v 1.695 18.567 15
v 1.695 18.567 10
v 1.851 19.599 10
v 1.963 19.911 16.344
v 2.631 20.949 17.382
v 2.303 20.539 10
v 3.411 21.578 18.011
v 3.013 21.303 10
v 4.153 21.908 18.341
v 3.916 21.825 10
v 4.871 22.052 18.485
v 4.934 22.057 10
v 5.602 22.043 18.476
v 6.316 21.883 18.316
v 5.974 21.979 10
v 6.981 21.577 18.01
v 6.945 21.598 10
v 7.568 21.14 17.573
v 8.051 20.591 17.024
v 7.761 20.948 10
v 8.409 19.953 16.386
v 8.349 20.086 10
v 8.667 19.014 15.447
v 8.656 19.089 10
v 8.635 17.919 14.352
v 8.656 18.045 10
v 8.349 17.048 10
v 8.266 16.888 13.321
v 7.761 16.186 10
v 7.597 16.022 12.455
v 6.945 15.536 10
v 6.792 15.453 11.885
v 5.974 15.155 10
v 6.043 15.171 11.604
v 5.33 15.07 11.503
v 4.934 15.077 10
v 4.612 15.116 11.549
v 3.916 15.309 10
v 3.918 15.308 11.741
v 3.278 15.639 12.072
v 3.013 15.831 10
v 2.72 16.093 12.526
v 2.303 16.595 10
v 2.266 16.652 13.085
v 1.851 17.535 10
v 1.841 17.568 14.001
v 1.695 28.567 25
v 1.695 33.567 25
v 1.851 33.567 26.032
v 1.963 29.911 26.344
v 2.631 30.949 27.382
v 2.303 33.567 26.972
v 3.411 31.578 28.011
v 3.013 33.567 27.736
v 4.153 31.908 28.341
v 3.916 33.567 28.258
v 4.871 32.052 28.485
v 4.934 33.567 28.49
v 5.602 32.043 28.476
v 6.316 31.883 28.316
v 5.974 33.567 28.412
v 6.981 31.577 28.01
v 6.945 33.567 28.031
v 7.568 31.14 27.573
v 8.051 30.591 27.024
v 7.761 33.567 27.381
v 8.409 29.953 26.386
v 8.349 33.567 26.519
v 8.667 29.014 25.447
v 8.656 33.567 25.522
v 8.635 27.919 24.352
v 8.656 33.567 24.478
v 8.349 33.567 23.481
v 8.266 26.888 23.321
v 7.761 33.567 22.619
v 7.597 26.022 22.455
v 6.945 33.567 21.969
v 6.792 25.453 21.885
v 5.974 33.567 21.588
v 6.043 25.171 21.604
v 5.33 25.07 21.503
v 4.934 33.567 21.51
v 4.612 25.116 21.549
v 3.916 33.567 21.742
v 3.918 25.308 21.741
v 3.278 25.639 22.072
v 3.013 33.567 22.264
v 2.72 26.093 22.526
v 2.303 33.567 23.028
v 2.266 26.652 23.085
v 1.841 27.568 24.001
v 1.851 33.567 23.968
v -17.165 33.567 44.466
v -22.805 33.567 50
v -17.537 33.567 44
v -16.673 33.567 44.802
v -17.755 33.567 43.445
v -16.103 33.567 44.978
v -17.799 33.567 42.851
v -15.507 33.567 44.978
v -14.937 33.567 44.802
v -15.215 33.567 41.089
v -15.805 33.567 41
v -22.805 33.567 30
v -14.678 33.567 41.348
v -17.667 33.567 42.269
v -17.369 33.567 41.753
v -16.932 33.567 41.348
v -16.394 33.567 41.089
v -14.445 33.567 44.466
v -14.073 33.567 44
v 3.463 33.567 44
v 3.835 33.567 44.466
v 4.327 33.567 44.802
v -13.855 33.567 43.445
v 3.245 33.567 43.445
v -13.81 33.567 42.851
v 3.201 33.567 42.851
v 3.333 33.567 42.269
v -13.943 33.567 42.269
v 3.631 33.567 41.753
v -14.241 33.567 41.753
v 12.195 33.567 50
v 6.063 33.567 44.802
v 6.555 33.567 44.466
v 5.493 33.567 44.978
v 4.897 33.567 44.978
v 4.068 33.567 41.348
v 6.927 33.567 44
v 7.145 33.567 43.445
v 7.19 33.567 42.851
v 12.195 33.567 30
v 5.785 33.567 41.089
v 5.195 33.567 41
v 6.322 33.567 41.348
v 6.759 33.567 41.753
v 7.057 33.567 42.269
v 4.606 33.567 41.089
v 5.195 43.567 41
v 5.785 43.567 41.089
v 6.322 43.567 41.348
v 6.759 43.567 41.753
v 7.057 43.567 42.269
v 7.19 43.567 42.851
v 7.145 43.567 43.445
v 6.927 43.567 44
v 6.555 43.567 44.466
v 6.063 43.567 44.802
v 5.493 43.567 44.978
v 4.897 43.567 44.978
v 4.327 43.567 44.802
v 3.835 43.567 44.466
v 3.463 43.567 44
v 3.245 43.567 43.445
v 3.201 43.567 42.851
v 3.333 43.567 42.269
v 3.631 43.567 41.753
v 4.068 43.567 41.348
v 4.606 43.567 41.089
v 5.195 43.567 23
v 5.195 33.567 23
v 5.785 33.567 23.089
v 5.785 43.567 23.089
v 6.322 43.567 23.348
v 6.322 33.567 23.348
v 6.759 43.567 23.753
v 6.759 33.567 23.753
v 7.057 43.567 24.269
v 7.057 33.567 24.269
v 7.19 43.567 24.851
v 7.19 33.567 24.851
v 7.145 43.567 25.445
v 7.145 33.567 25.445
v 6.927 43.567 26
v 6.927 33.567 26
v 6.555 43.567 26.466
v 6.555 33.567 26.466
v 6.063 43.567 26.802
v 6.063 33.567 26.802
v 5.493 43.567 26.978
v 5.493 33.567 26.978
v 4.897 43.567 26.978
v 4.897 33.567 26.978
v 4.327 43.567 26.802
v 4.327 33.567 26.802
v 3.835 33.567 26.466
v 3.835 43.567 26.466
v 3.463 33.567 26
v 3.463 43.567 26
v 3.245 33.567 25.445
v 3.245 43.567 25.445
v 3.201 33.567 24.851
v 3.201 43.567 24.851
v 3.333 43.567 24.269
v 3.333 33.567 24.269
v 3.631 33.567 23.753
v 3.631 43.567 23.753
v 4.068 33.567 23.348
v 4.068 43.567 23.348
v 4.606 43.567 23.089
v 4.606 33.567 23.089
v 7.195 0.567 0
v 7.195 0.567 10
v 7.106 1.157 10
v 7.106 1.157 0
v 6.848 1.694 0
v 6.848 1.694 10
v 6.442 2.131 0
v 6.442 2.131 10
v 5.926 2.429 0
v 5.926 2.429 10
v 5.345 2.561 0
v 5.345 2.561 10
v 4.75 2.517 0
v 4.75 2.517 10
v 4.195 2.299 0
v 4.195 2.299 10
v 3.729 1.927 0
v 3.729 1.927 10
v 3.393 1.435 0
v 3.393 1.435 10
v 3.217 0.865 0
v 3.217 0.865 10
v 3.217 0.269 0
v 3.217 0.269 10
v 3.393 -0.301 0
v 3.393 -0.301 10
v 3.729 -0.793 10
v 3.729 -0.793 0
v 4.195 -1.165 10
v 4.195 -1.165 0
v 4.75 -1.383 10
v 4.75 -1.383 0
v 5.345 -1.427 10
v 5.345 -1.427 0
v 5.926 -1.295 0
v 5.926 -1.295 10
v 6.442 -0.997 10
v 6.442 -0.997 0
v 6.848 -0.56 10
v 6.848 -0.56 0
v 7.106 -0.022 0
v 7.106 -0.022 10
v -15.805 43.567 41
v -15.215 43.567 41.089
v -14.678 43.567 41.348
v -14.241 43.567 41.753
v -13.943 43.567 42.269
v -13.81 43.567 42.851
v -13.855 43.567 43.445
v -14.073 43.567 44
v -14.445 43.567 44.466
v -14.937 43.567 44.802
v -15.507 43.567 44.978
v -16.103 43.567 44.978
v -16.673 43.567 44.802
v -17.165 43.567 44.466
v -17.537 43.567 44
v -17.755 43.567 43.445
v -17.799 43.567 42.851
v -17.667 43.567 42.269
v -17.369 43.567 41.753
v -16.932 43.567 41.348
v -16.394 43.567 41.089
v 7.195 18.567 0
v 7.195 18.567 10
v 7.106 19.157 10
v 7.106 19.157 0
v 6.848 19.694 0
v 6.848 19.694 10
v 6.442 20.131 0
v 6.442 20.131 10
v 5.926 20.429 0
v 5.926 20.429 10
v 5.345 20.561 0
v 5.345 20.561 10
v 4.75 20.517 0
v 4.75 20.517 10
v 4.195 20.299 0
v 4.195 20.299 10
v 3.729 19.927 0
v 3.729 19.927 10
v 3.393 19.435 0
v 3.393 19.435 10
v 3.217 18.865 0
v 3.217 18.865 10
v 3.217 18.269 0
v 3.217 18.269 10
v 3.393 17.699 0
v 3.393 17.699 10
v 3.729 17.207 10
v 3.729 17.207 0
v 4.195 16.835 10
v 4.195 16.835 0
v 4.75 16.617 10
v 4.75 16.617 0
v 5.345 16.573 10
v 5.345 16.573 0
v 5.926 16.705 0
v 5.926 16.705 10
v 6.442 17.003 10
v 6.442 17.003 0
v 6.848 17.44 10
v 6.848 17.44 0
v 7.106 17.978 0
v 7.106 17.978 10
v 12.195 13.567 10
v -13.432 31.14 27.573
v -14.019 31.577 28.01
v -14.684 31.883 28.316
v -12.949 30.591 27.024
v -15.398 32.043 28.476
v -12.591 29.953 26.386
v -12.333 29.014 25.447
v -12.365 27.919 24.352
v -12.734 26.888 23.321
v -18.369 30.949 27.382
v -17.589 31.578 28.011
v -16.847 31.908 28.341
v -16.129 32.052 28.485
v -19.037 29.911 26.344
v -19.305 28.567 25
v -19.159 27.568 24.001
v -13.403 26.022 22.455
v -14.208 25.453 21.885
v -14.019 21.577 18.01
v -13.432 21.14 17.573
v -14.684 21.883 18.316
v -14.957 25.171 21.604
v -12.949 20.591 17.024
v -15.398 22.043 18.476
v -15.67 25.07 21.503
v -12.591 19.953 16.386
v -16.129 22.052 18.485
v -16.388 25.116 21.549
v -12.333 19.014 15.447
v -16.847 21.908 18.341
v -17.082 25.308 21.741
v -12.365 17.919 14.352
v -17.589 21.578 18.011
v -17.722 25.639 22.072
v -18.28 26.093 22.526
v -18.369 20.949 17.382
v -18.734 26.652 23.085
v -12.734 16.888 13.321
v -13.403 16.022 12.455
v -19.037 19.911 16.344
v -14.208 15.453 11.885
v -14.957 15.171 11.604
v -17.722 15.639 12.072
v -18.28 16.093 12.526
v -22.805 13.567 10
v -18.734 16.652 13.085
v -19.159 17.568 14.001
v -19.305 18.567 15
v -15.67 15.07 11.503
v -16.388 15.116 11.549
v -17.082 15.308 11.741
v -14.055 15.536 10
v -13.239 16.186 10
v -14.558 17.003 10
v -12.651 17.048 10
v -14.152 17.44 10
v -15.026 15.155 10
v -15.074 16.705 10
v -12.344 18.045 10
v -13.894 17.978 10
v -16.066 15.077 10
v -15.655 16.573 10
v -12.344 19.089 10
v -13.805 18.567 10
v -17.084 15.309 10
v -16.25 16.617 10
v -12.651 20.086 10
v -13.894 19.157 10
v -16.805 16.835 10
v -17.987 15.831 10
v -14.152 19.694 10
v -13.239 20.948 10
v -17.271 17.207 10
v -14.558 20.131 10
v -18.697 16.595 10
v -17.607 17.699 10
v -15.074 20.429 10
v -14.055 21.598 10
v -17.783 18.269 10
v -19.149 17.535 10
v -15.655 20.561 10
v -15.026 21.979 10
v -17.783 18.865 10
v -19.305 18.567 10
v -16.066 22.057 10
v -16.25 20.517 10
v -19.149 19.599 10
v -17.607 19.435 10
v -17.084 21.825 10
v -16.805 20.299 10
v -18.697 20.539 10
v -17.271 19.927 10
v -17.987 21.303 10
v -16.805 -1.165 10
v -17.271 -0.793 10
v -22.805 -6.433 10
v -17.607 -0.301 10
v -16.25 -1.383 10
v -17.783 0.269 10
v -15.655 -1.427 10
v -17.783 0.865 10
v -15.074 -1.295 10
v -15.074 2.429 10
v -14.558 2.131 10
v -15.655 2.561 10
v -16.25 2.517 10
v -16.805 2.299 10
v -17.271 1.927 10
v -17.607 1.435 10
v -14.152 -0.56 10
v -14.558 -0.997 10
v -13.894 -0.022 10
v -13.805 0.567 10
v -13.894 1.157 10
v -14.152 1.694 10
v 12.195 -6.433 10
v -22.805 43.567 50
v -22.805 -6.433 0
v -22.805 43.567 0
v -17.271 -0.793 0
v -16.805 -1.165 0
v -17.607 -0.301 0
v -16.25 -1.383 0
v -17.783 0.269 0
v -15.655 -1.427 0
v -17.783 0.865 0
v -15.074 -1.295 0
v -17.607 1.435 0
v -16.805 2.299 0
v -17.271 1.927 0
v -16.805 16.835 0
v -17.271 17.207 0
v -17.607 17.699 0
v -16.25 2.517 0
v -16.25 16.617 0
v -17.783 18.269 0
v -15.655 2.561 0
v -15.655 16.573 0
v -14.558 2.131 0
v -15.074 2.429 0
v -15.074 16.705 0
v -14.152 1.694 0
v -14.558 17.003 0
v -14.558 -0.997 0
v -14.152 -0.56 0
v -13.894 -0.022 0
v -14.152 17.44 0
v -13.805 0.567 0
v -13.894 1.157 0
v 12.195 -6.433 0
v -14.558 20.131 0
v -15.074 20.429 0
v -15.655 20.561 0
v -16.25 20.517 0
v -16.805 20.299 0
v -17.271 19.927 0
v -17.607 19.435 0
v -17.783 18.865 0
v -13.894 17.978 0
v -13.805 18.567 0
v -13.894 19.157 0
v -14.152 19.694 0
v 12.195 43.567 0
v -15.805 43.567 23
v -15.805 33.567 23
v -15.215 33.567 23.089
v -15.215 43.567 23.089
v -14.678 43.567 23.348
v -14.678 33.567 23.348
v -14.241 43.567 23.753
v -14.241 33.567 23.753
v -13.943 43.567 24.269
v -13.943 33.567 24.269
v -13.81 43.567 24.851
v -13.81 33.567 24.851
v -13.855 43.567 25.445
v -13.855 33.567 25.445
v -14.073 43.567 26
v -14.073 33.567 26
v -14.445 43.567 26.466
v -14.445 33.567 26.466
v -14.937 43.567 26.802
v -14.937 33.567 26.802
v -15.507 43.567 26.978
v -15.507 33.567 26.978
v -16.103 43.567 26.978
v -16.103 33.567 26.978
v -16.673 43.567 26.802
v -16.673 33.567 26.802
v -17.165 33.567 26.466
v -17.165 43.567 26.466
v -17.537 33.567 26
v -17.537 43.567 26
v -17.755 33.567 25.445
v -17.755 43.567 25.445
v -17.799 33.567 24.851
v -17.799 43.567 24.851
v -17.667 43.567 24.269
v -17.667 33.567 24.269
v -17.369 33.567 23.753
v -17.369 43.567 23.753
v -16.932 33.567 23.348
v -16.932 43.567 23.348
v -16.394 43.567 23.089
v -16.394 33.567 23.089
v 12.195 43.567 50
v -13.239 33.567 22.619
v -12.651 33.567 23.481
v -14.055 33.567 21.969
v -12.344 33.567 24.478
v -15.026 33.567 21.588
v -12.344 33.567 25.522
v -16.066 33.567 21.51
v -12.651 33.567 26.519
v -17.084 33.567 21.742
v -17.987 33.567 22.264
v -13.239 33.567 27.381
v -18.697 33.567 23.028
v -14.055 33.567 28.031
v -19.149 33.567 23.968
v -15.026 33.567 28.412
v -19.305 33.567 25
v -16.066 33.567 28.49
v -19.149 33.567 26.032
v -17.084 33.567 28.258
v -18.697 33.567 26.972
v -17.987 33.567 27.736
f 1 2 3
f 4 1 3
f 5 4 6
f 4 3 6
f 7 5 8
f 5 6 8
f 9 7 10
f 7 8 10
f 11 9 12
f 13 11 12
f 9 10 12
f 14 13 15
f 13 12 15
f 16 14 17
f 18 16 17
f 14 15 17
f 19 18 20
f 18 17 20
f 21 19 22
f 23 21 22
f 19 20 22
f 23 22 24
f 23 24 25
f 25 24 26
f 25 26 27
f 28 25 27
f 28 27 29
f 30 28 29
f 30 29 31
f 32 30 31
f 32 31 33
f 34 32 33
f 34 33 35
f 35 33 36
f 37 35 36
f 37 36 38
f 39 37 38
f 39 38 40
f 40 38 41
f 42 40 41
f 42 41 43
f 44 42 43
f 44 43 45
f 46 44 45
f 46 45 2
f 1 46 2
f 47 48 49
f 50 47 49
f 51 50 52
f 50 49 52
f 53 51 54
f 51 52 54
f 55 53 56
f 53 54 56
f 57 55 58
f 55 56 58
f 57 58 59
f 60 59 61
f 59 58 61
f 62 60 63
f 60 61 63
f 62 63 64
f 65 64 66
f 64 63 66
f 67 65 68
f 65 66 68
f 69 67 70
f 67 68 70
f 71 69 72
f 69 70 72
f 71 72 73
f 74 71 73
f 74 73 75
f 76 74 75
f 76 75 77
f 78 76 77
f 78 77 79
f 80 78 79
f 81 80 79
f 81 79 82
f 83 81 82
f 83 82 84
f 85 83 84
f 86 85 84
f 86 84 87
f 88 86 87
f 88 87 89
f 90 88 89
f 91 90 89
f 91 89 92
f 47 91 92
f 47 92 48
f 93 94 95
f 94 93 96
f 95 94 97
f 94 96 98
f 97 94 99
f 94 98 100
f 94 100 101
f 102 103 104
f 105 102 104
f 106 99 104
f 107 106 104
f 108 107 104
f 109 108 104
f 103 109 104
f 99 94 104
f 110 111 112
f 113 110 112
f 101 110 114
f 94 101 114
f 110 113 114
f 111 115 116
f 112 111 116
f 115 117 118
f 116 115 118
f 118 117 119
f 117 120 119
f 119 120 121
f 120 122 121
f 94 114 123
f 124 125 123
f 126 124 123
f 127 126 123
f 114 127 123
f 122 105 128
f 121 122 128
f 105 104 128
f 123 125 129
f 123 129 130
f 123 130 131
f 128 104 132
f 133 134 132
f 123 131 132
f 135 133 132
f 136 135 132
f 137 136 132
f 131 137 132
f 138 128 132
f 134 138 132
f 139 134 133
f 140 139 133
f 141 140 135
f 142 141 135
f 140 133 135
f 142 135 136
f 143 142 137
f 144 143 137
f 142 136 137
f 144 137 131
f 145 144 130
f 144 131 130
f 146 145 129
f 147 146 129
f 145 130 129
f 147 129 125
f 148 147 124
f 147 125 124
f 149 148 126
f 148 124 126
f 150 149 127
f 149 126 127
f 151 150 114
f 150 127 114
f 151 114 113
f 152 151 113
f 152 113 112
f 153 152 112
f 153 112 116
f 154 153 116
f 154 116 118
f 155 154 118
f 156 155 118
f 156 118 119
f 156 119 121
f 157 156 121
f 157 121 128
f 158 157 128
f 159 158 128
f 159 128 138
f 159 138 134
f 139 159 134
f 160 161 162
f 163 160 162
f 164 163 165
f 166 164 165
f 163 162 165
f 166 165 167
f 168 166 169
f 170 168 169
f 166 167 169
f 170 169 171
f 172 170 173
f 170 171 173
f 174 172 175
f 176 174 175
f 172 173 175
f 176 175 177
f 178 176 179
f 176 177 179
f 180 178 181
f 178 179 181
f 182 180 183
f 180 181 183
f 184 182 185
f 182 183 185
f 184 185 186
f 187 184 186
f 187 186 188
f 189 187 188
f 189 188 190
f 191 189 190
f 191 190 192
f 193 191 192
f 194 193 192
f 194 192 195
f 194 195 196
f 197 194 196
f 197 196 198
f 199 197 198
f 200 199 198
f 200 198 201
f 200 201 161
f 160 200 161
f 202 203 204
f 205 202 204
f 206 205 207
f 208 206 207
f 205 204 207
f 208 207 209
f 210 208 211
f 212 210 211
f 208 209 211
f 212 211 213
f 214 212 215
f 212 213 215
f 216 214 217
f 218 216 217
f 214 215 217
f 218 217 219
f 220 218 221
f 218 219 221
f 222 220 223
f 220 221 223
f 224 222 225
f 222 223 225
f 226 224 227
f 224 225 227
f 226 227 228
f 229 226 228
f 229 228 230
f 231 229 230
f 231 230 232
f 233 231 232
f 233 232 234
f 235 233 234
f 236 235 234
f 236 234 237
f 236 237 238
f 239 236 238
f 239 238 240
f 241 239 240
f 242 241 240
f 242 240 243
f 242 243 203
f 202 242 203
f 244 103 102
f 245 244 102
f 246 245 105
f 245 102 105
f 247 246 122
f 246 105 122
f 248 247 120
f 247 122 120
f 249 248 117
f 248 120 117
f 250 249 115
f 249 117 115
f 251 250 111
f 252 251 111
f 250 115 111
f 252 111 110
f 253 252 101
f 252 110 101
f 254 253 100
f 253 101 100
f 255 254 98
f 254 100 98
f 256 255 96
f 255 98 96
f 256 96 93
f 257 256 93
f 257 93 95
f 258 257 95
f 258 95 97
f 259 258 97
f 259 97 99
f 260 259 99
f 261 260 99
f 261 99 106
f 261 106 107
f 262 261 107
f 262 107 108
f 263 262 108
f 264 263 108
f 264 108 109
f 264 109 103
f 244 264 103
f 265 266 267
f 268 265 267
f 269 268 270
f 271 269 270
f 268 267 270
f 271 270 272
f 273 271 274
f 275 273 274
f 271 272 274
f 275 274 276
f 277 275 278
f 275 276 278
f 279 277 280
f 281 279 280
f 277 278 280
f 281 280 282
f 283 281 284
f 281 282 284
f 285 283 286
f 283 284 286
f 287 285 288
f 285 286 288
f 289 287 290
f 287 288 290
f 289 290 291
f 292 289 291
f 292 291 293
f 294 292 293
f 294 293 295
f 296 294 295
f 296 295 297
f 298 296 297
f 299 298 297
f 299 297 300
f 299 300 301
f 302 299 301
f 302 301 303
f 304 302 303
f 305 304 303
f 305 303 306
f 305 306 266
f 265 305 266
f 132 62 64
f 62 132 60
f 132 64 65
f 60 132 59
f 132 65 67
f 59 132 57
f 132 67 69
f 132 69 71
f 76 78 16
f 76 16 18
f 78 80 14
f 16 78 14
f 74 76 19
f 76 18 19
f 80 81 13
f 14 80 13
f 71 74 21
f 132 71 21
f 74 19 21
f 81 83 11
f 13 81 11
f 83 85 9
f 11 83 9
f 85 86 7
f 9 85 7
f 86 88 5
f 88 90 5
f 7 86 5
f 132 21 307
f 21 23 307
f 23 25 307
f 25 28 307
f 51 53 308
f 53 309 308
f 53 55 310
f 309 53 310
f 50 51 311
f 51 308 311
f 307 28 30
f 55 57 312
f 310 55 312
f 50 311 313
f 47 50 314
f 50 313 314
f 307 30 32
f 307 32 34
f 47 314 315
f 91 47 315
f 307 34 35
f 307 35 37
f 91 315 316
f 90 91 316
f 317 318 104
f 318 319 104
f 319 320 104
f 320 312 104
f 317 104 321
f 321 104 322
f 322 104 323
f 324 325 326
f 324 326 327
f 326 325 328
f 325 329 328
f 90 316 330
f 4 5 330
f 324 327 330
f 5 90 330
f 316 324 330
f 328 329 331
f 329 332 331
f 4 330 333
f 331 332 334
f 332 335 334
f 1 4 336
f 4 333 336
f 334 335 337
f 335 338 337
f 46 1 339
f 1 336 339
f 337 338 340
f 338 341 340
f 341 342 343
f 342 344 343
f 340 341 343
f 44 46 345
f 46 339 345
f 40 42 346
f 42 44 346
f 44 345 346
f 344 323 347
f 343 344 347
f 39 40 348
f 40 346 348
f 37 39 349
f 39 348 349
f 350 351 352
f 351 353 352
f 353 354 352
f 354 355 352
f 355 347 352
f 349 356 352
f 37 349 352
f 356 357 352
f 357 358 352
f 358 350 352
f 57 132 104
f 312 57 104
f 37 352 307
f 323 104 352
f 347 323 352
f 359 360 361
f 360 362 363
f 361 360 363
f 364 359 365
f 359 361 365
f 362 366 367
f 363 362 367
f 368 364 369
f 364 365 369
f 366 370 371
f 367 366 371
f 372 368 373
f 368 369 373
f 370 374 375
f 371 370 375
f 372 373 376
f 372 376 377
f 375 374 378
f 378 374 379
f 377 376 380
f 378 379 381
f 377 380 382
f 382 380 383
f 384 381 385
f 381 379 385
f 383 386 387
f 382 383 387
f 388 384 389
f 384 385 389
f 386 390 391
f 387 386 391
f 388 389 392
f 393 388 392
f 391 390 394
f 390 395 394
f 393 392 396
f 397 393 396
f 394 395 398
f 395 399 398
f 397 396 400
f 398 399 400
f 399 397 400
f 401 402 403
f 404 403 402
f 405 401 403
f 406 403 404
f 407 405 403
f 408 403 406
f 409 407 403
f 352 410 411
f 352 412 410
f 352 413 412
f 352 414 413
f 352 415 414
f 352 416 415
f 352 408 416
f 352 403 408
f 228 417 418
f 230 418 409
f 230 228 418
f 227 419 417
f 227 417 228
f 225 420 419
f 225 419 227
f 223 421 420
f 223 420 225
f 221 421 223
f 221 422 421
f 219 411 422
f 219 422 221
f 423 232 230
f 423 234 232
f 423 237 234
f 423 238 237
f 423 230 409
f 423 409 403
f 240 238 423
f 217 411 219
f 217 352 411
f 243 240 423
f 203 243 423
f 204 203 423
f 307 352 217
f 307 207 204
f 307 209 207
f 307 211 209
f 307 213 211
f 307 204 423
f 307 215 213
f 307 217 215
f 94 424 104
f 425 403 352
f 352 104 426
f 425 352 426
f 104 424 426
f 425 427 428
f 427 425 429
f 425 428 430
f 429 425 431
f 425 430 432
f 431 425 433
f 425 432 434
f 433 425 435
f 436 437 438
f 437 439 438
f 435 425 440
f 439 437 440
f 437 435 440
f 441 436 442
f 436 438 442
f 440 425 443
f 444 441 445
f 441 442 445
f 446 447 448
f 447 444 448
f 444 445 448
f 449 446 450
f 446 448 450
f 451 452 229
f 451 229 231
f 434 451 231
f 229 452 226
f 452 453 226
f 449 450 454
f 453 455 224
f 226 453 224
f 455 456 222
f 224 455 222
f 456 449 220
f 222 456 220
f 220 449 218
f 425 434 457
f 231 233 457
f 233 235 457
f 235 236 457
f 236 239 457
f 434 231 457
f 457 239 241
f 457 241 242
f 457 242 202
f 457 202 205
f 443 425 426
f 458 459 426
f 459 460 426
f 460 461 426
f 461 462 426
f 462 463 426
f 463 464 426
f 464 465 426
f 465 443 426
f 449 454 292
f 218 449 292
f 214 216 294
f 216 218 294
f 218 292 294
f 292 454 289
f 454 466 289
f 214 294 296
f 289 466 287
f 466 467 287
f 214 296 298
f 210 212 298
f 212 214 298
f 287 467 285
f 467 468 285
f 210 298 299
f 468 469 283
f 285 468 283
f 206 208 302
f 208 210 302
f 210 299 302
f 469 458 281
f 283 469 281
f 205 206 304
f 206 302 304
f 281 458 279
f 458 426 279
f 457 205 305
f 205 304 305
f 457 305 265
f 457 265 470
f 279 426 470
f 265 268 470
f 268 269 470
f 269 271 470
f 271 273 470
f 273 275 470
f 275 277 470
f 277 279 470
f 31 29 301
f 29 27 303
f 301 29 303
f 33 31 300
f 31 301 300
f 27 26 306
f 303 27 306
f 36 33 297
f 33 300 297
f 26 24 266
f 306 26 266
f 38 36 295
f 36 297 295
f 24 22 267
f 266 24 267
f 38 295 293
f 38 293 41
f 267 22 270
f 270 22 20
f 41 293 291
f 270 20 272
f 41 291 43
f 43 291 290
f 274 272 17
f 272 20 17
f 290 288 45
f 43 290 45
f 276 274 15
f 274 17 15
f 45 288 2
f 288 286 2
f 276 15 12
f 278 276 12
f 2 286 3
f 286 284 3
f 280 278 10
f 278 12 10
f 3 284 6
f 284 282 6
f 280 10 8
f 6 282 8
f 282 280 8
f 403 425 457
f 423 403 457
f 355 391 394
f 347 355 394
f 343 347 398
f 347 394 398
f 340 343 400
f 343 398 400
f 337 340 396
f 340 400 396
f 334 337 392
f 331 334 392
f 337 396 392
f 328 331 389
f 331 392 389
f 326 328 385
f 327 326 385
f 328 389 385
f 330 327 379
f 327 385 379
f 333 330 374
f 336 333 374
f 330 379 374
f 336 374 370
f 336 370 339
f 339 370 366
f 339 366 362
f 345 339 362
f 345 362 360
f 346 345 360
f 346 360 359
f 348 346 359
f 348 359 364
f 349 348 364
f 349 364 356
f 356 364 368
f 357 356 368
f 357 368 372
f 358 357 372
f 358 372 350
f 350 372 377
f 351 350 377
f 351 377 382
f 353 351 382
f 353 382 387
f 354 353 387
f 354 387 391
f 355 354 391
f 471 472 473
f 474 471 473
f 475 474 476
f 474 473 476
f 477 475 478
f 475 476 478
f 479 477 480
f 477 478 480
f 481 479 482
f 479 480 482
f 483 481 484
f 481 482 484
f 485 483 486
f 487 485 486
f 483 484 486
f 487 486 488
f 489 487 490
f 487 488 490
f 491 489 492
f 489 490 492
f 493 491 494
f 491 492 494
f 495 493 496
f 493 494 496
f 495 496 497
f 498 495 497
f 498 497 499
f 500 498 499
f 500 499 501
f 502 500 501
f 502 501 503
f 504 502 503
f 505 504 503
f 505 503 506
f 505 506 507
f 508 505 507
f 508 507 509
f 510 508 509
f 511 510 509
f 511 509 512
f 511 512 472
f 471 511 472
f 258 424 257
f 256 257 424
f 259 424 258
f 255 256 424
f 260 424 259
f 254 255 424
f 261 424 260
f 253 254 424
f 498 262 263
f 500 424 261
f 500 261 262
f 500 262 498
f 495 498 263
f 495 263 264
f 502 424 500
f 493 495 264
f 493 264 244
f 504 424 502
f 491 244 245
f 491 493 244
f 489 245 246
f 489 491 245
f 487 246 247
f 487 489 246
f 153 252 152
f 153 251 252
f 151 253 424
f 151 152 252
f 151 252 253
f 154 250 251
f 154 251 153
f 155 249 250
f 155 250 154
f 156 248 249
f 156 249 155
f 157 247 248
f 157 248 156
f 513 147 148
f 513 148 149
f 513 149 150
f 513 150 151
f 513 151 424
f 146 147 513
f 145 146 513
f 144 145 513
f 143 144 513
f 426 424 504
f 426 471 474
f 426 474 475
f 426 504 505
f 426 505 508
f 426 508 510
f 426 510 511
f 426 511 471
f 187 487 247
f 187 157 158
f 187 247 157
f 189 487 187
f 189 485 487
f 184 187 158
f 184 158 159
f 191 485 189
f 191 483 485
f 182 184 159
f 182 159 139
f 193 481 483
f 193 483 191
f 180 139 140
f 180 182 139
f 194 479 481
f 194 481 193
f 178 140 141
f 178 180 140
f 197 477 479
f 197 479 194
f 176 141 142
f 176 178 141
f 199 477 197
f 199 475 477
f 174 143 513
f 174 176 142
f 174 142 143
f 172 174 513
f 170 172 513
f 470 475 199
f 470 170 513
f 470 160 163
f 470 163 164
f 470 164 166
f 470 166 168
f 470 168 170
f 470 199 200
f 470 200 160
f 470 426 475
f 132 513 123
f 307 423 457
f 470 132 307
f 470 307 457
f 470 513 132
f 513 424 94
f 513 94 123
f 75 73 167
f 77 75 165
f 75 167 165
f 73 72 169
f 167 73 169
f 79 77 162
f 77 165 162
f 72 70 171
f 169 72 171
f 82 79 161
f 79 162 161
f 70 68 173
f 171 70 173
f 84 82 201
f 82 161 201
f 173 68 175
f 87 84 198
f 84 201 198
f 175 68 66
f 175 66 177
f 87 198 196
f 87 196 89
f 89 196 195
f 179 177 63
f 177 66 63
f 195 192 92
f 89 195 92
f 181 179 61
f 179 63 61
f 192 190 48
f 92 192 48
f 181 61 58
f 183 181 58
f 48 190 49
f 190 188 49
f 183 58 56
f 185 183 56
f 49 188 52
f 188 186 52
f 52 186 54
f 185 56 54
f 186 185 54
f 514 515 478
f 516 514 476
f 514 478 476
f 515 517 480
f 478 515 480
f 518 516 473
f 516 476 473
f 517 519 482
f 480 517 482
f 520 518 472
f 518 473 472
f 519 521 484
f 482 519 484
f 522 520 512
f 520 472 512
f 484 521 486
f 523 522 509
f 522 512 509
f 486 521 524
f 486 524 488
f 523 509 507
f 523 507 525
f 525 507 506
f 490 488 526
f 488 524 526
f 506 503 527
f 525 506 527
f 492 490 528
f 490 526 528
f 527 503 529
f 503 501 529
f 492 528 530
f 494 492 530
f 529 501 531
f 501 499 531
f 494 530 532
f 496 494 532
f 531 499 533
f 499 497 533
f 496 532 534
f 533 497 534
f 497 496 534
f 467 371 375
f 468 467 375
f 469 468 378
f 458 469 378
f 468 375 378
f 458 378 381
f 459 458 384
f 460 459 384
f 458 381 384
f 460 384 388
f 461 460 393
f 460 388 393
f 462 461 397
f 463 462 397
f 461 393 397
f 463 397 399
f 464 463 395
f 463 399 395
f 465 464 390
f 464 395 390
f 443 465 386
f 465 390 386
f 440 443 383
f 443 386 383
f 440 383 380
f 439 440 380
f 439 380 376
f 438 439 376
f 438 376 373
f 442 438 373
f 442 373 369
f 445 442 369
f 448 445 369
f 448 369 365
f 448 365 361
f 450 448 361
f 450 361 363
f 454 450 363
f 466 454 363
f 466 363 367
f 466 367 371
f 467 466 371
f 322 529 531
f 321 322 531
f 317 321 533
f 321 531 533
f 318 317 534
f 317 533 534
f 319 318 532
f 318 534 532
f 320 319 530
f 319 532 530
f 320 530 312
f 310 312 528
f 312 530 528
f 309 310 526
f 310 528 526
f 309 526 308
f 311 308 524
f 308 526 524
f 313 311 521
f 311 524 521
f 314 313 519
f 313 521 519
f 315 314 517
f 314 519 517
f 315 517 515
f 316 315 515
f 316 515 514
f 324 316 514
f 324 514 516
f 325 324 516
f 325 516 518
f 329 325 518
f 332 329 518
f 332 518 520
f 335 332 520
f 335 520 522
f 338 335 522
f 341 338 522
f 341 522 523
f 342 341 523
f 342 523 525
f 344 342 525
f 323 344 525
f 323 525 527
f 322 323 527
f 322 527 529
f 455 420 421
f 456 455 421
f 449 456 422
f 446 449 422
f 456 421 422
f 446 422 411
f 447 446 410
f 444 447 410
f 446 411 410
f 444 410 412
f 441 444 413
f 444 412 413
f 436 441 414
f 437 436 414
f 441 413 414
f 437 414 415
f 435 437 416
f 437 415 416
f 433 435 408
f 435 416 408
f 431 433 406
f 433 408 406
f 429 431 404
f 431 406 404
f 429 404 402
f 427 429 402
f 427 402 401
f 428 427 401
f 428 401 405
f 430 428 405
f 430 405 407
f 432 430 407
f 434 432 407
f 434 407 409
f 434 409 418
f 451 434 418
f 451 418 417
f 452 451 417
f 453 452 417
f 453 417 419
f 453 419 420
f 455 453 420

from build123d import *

# Parameters (mm, degrees)
SKETCH1_W           = 35
SKETCH1_H           = 50
BOSS_EXTRUDE1_DEPTH = 10
SKETCH2_W           = 35
SKETCH2_H           = 10
BOSS_EXTRUDE2_DEPTH = 40
SKETCH3_R           = 2
CUT_EXTRUDE1_DEPTH  = 30
SKETCH4_R           = 2
CUT_EXTRUDE2_DEPTH  = 30
BOSS_EXTRUDE3_DEPTH = 35
SKETCH6_R           = 3.5
CUT_EXTRUDE3_DEPTH  = 30
SKETCH7_R           = 3.5
CUT_EXTRUDE4_DEPTH  = 30


with BuildPart() as part:
    # Sketch1 → Boss-Extrude1 (new body)
    with BuildSketch(Plane.XY):
        with Locations((-5.304878049, 18.567073171)):
            Rectangle(SKETCH1_W, SKETCH1_H)
    extrude(amount=BOSS_EXTRUDE1_DEPTH)

    # Sketch2 → Boss-Extrude2 (add)
    with BuildSketch(Plane.XY.offset(10)):
        with Locations((-5.304878049, 38.567073171)):
            Rectangle(SKETCH2_W, SKETCH2_H)
    extrude(amount=BOSS_EXTRUDE2_DEPTH)

    # Sketch3 → Cut-Extrude1 (cut)
    with BuildSketch(Plane.XY.offset(10)):
        with Locations((5.195121951, 0.567073171)):
            Circle(SKETCH3_R)
        with Locations((-15.804878049, 18.567073171)):
            Circle(SKETCH3_R)
        with Locations((5.195121951, 18.567073171)):
            Circle(SKETCH3_R)
        with Locations((-15.804878049, 0.567073171)):
            Circle(SKETCH3_R)
    extrude(amount=-CUT_EXTRUDE1_DEPTH, mode=Mode.SUBTRACT)

    # Sketch4 → Cut-Extrude2 (cut)
    with BuildSketch(Plane.XZ.offset(-33.567073171)):
        with Locations(Location((-15.804878049, 43, 0), (0, 0, 270))):
            Circle(SKETCH4_R)
        with Locations(Location((5.195121951, 43, 0), (0, 0, 270))):
            Circle(SKETCH4_R)
        with Locations(Location((-15.804878049, 25, 0), (0, 0, 270))):
            Circle(SKETCH4_R)
        with Locations(Location((5.195121951, 25, 0), (0, 0, 270))):
            Circle(SKETCH4_R)
    extrude(amount=-CUT_EXTRUDE2_DEPTH, mode=Mode.SUBTRACT)

    # Sketch5 → Boss-Extrude3 (add)
    with BuildSketch(Plane.ZY.offset(22.804878049)):
        Polygon((30, 33.567073171), (10, 13.567073171), (10, 33.567073171), align=None)
    extrude(amount=-BOSS_EXTRUDE3_DEPTH)

    # Sketch6 → Cut-Extrude3 (cut)
    with BuildSketch(Plane(origin=(0, 33.567073171, 0), x_dir=(1, 0, 0), z_dir=(0, 1, 0))):
        with Locations(Location((5.195121951, -25, 0), (0, 0, 180))):
            Circle(SKETCH6_R)
        with Locations(Location((-15.804878049, -25, 0), (0, 0, 180))):
            Circle(SKETCH6_R)
    extrude(amount=-CUT_EXTRUDE3_DEPTH, mode=Mode.SUBTRACT)

    # Sketch7 → Cut-Extrude4 (cut)
    with BuildSketch(Plane(origin=(0, 0, 10), x_dir=(-1, 0, 0), z_dir=(0, 0, -1))):
        with Locations((-5.195121951, 18.567073171)):
            Circle(SKETCH7_R)
        with Locations((15.804878049, 18.567073171)):
            Circle(SKETCH7_R)
    extrude(amount=-CUT_EXTRUDE4_DEPTH, mode=Mode.SUBTRACT)


solid = part.part
